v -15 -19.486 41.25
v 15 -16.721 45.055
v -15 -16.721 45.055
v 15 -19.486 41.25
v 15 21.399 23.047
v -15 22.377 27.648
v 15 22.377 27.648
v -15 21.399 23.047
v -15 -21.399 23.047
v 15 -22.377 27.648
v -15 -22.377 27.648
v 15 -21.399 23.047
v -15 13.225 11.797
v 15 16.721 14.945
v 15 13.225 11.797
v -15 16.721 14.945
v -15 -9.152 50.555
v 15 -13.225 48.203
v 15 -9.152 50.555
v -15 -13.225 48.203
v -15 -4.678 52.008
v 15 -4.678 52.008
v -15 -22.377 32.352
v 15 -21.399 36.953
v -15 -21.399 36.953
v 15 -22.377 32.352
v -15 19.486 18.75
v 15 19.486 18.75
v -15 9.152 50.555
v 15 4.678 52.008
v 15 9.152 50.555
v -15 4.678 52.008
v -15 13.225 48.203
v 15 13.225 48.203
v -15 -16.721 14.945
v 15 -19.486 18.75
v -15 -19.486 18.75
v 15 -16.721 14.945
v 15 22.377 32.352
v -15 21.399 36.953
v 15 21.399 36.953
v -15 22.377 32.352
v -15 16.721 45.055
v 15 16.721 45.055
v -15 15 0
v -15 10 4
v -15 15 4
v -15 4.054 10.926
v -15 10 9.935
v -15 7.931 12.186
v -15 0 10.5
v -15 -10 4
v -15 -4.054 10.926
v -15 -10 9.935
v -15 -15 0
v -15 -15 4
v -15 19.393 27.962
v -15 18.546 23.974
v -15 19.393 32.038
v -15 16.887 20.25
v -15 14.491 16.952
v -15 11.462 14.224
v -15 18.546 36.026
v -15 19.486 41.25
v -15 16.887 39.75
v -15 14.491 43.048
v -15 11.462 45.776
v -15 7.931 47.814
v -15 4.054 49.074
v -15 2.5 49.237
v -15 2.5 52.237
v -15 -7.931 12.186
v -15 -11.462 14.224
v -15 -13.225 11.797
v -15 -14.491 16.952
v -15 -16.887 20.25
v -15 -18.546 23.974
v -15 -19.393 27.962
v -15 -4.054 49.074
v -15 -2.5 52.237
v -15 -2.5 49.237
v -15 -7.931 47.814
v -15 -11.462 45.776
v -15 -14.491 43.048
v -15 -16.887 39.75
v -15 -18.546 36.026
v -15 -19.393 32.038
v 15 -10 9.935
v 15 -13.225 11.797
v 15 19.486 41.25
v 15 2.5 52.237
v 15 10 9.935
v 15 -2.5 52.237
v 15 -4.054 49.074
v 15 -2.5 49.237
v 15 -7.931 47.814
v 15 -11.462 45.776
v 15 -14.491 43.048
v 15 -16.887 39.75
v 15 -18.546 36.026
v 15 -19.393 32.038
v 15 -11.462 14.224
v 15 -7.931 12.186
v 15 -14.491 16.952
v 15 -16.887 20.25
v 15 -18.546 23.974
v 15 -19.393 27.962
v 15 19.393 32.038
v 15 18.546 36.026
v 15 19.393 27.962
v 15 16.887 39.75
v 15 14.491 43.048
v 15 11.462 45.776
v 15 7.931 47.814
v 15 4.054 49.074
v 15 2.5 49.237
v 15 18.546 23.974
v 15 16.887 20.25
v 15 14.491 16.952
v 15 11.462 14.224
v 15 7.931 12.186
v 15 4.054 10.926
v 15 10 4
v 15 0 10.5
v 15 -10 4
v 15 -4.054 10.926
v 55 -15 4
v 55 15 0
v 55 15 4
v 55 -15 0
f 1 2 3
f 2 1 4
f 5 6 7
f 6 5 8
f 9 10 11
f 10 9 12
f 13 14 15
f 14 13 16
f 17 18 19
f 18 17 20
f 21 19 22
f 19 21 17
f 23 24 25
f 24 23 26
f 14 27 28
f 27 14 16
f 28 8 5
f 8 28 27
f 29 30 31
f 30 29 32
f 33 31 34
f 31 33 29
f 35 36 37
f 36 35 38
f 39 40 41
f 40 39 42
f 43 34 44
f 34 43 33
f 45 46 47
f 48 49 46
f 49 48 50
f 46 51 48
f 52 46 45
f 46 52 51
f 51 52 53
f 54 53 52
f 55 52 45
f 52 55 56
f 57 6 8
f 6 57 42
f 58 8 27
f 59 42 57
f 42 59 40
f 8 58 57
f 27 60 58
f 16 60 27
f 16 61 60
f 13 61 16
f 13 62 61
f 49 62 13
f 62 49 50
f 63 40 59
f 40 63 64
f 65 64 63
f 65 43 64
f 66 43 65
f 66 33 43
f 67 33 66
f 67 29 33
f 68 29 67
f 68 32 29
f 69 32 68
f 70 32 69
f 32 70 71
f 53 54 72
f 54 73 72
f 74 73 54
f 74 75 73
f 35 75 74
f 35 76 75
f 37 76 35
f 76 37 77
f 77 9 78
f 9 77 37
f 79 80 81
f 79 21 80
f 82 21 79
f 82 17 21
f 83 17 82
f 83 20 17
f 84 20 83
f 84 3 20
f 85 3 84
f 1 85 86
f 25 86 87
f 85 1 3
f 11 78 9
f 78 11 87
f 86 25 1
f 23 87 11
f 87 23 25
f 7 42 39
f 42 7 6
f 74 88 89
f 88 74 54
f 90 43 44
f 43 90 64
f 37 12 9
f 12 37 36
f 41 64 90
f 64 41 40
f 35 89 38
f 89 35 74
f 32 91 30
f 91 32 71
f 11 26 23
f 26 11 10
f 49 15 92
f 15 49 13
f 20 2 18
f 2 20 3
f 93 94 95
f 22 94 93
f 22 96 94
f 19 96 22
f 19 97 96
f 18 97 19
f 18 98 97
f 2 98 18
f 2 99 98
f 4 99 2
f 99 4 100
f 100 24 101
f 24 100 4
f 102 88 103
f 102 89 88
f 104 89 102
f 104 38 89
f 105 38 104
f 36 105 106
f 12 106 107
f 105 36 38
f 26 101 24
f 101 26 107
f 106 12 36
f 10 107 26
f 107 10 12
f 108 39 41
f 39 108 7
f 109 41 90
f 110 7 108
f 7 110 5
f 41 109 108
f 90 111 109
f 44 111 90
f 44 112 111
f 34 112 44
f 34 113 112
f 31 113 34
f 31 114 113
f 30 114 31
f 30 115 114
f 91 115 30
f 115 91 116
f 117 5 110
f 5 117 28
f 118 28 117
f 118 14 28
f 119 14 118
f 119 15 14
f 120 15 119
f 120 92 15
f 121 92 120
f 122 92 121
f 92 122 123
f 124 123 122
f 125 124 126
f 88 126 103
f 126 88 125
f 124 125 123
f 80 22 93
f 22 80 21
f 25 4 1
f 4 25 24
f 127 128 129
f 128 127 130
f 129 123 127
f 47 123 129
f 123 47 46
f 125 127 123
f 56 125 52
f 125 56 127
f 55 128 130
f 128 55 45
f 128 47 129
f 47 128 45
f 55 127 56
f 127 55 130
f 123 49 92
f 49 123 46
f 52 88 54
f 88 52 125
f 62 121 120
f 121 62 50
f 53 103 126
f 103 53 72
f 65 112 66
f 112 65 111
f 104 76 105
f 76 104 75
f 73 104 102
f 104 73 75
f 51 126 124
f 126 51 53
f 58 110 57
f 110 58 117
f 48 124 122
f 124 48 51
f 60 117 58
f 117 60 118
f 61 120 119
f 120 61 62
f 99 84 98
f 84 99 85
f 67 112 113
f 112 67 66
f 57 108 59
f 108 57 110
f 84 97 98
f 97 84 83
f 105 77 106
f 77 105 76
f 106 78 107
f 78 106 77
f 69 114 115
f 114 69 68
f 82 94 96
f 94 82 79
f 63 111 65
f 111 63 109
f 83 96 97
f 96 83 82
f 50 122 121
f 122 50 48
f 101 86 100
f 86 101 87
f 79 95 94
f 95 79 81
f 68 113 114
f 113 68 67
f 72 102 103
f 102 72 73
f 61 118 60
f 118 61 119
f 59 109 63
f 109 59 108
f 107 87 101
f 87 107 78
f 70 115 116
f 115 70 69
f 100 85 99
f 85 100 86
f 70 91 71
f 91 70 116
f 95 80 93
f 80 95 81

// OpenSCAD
module m3(H) cylinder(r=1.75,h=H,$fn=30,center=true);


module pvc(H){
	color("grey")cylinder(h=H,r=20.5,center=true);
}

module horn(){


}

module taladros(H){
	translate([16,16,-10])m3(30);
	translate([16,-16,-10])m3(30);
	translate([-16,16,-10])m3(30);
	translate([-16,-16,-10])m3(30);
	translate([16,16,H])cylinder(r=3.2, h=8, $fn=20);
	translate([-16,16,H])cylinder(r=3.2, h=8, $fn=20);
	translate([16,-16,H])cylinder(r=3.2, h=8, $fn=20);
	translate([-16,-16,H])cylinder(r=3.2, h=8, $fn=20);
}

module servo_996r(H){
	cube([41.5,21,H],center=true);
	translate([25,5,0])m3(H);
	translate([-25,-5,0])m3(H);
	translate([25,-5,0])m3(H);
	translate([-25,5,0])m3(H);
}

module soporte_barra(){
	difference(){
		hull(){
			translate([-28,-28,0])cube([56,56,40]);
		}
		hull(){
			translate([0,0,30])rotate([0,90,0])pvc(100);
			translate([0,0,50])rotate([0,90,0])pvc(100);
		}
		translate([15,0,30])rotate([90,0,0])cylinder(h=100,r=2.25,$fn=20,center=true);
		translate([-15,0,30])rotate([90,0,0])cylinder(h=100,r=2.25,$fn=20,center=true);
		taladros(3);
	}
}

module soporte_servo(){
	difference(){
		union(){
			translate([-28,-28,0])cube([56,56,4]);
			translate([-28,0,0])cube([56,8,30]);
		}

		translate([0,0,16])rotate([90,0,0])servo_996r(100);
		taladros(2);
	}
}

module anilla(){
	difference(){
		union(){
			cylinder(r=76/2+4,h=30,$fn=100);
			translate([5,-20,0])cube([50,40,30]);
			translate([50,-35,0])cube([5,70,30]);
		}
		translate([0,0,-1])cylinder(r=75.5/2,h=32,$fn=100);
		translate([55,28,15])rotate([0,90,0])m3(20);
		translate([55,-28,15])rotate([0,90,0])m3(20);
		rotate([0,0,-40])translate([0,0,-1])cube([1.5,100,100]);
	}

}

module soporte_bote(){
	difference(){
		union(){
			translate([-90,-35,0])cube([180,70,3]);
			translate([10,30,0])cube([20,15,20]);
			translate([-30,30,0])cube([20,15,20]);
			translate([-10,-23,0])cube([70,10,23]);			
		}
		translate([75,-28,-1])m3(20);
		translate([75,28,-1])m3(20);
		translate([-75,-28,-1])m3(20);
		translate([-75,28,-1])m3(20);

		//%translate([65,-20,-1])m3(20);
		//%translate([65,20,-1])m3(20);
		//%translate([-65,-20,-1])m3(20);
		//%translate([-65,20,-1])m3(20);
		
		translate([0,37.5,12.5])rotate([0,90,0])m3(100);
		translate([20,-15,14])rotate([90,0,0])servo_996r(30);
		taladros(2);
		rotate([0,0,-30])taladros(2);
		rotate([0,0,-15])taladros(2);
		rotate([0,0,45])taladros(2);

		
	}
}

ang=0;
module gatillo(){
	difference(){
		union(){
			cylinder(r=6,h=20);
			rotate([0,0,-20])translate([-2,0,0])cube([4,80,20]);
			translate([10,80,0])cylinder(r=76/2+4,h=20);
			hull(){
				translate([0,90,0])rotate([0,0,ang])translate([110,0,0])cylinder(r=2,h=20,$fn=20);
				translate([0,90,0])cylinder(r=2,h=20,$fn=20);
			}

		}

		translate([0,90,0])rotate([0,0,ang])translate([100,10,10])rotate([90,0,0])cylinder(r=2,h=20,$fn=20);
		translate([10,80,-1])cylinder(r=75.5/2,h=22);
		translate([-102.1,20,-1])cube([100,200,50]);
		translate([-102.1,20,-1])cube([100,200,50]);
		translate([-10,92.1,-1])cube([100,100,50]);
		translate([-44.5,30,-10])rotate([0,0,-20])cube([50,80,40]);
		m3(50);
		
	}

}

module catapulta(){
	difference(){
		union(){
			translate([0,10,0])cylinder(r=10,h=5);
			cube([100,20,5]);
			translate([60,0,0])cube([40,6,40]);

			hull(){
				translate([77,0,0])cube([6,6,40]);
				translate([77,0,0])cube([6,20,5]);
			}
		}
		translate([65,20,10])rotate([90,0,0])cylinder(r=1.75,h=50,$fn=20);
		translate([95,20,10])rotate([90,0,0])cylinder(r=1.75,h=50,$fn=20);
		translate([65,20,35])rotate([90,0,0])cylinder(r=1.75,h=50,$fn=20);
		translate([95,20,35])rotate([90,0,0])cylinder(r=1.75,h=50,$fn=20);

		hull(){
			translate([0,10,-7])cylinder(r=7,h=10);
			translate([41-7-4.5,10,-7])cylinder(r=4.5,h=10);

		}
		translate([0,10,-4])cylinder(r=5,h=50);
		translate([16,10,-4])cylinder(r=1.75,h=50,$fn=20);
		translate([30,10,-4])cylinder(r=1.75,h=50,$fn=20);

	}
}

module soporte_soplador(){
	difference(){
		union(){
			translate([0,0,30])rotate([0,90,0])cylinder(r=39/2+3,h=56,center=true);
			translate([-28,-28,0])cube([56,56,4]);
			translate([-28,-10,0])cube([56,20,40]);
		}
		translate([0,0,30])rotate([0,90,0])cylinder(r=39/2,h=60,center=true);
			translate([0,0,80])cube([100,5,80],center=true);
		taladros(2);


	}

}

module punta_soplador(){
	difference(){
		union(){
			translate([0,0,30])rotate([0,90,0])cylinder(r=39/2+3,h=30,center=true);
			translate([-15,-15,0])cube([70,30,4]);
			translate([-15,-10,0])cube([30,20,40]);
		}
		translate([0,0,30])rotate([0,90,0])cylinder(r=39/2,h=60,center=true);
		translate([0,0,80])cube([100,5,80],center=true);


	}

}

punta_soplador();

//translate([10,37.5,12.5])rotate([60,0,0])rotate([0,-90,0])gatillo();
/*translate([60,0,68])rotate([0,90,0])/**///anilla();
/*translate([-90,0,68])rotate([0,90,0])anilla();
soporte_bote();
/**/
